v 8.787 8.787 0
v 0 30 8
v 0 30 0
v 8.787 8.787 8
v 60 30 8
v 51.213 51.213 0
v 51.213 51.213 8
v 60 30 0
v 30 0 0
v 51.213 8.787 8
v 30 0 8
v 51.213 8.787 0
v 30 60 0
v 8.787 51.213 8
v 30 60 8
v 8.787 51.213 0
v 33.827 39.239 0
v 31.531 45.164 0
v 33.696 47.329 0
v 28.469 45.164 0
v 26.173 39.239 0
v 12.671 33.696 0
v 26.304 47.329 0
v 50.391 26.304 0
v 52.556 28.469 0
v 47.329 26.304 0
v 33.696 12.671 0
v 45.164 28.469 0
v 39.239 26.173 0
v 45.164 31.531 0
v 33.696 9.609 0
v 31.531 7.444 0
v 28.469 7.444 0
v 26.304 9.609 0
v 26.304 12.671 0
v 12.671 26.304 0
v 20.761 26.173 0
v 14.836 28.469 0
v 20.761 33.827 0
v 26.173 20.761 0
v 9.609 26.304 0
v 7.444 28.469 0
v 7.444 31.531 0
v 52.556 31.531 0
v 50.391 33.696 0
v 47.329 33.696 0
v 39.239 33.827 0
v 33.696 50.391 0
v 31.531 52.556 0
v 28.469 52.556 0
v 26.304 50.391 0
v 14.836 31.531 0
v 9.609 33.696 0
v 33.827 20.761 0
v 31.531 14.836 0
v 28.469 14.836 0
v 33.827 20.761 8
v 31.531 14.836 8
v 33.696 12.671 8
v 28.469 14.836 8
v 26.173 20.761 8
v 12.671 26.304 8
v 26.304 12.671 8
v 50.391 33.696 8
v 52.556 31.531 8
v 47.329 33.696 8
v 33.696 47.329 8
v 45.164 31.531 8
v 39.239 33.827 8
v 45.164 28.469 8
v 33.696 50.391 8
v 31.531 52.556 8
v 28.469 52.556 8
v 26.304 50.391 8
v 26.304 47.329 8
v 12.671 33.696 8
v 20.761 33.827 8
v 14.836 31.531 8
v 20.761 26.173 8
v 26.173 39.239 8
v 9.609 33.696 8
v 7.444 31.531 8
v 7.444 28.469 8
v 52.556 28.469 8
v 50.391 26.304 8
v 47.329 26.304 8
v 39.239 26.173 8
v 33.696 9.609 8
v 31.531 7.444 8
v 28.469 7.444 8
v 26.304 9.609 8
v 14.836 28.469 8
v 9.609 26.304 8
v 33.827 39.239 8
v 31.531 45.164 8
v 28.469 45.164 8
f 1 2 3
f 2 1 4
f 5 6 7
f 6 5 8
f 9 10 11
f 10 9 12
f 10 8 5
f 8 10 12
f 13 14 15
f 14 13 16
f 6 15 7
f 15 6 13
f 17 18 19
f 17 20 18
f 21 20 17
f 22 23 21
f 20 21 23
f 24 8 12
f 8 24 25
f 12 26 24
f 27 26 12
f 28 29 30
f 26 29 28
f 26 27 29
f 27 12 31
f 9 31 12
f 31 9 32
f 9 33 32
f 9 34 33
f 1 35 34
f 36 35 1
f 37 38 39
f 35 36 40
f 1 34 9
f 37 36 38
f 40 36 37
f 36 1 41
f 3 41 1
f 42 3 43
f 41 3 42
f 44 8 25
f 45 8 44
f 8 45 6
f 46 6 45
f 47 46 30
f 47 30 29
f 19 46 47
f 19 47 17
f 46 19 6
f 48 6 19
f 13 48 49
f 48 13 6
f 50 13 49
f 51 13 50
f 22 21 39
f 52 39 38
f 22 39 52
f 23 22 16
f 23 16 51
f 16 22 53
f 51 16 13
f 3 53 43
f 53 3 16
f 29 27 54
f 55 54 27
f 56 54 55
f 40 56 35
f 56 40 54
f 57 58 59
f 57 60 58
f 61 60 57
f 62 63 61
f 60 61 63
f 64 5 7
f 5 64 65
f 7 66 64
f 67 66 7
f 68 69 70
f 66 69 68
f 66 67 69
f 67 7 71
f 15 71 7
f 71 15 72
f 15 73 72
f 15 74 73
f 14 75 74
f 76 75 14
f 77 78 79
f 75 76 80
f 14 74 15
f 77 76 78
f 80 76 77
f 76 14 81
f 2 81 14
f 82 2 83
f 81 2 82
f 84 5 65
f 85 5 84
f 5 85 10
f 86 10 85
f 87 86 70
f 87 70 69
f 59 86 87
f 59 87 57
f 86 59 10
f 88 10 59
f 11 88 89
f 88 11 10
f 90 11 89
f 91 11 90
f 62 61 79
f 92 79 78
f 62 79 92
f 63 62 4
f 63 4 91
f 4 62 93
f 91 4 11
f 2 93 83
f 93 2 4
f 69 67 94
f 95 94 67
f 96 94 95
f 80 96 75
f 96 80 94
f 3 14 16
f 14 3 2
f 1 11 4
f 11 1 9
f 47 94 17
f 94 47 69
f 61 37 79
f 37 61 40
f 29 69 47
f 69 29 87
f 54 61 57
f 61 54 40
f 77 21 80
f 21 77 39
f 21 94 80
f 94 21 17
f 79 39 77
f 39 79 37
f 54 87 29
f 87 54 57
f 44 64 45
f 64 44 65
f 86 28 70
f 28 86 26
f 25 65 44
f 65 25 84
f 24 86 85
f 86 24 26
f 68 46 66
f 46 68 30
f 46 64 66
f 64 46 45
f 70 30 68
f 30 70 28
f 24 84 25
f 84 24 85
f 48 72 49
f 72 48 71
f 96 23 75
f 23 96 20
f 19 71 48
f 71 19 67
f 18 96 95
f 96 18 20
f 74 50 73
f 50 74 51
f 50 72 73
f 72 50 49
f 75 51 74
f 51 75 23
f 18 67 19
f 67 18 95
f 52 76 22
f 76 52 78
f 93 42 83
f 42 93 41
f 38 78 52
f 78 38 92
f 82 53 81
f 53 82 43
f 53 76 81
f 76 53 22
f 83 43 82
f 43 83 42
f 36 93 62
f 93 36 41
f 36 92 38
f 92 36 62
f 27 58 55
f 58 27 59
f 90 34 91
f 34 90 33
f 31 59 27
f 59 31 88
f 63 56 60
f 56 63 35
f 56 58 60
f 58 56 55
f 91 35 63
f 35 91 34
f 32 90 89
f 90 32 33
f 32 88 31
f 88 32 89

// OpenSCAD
$fn = 32;

// ----------------------------------------------------------------------
// Polygon plate: 8-gon R30, 4 bolt windows
// ----------------------------------------------------------------------

// --- parameters (mm) ---
sides = 8;                // number of polygon sides
plate_r = 30;             // circumscribed radius of the polygon
bore_r = 10;              // centre bore radius
bolts = 4;                // number of bolt windows
ring_r = 18.86;           // bolt-circle radius
bolt_r = 4;               // bolt window radius
plate_t = 8;              // plate thickness, Z (extrusion height)

plate_d = 2 * plate_r;  // circumscribed diameter
bore_d = 2 * bore_r;  // centre bore diameter
bolt_d = 2 * bolt_r;  // bolt window diameter
ring_d = 2 * ring_r;  // bolt-circle diameter

profile = [[60, 30], [51.213, 51.213], [30, 60], [8.787, 51.213], [0, 30], [8.787, 8.787], [30, 0], [51.213, 8.787]];  // primary outline, 8 points, counter clockwise
void_1 = [[39.239, 33.827], [33.827, 39.239], [26.173, 39.239], [20.761, 33.827], [20.761, 26.173], [26.173, 20.761], [33.827, 20.761], [39.239, 26.173]];  // centre bore, 8 points
void_2 = [[52.556, 31.531], [50.391, 33.696], [47.329, 33.696], [45.164, 31.531], [45.164, 28.469], [47.329, 26.304], [50.391, 26.304], [52.556, 28.469]];  // bolt window 1, 8 points
void_3 = [[33.696, 50.391], [31.531, 52.556], [28.469, 52.556], [26.304, 50.391], [26.304, 47.329], [28.469, 45.164], [31.531, 45.164], [33.696, 47.329]];  // bolt window 2, 8 points
void_4 = [[14.836, 31.531], [12.671, 33.696], [9.609, 33.696], [7.444, 31.531], [7.444, 28.469], [9.609, 26.304], [12.671, 26.304], [14.836, 28.469]];  // bolt window 3, 8 points
void_5 = [[33.696, 12.671], [31.531, 14.836], [28.469, 14.836], [26.304, 12.671], [26.304, 9.609], [28.469, 7.444], [31.531, 7.444], [33.696, 9.609]];  // bolt window 4, 8 points

// --- the one profile operation ---
difference() {
  linear_extrude(height = plate_t) polygon(points = profile);
  translate([0, 0, -1])
    linear_extrude(height = plate_t + 2) polygon(points = void_1);
  translate([0, 0, -1])
    linear_extrude(height = plate_t + 2) polygon(points = void_2);
  translate([0, 0, -1])
    linear_extrude(height = plate_t + 2) polygon(points = void_3);
  translate([0, 0, -1])
    linear_extrude(height = plate_t + 2) polygon(points = void_4);
  translate([0, 0, -1])
    linear_extrude(height = plate_t + 2) polygon(points = void_5);
}
